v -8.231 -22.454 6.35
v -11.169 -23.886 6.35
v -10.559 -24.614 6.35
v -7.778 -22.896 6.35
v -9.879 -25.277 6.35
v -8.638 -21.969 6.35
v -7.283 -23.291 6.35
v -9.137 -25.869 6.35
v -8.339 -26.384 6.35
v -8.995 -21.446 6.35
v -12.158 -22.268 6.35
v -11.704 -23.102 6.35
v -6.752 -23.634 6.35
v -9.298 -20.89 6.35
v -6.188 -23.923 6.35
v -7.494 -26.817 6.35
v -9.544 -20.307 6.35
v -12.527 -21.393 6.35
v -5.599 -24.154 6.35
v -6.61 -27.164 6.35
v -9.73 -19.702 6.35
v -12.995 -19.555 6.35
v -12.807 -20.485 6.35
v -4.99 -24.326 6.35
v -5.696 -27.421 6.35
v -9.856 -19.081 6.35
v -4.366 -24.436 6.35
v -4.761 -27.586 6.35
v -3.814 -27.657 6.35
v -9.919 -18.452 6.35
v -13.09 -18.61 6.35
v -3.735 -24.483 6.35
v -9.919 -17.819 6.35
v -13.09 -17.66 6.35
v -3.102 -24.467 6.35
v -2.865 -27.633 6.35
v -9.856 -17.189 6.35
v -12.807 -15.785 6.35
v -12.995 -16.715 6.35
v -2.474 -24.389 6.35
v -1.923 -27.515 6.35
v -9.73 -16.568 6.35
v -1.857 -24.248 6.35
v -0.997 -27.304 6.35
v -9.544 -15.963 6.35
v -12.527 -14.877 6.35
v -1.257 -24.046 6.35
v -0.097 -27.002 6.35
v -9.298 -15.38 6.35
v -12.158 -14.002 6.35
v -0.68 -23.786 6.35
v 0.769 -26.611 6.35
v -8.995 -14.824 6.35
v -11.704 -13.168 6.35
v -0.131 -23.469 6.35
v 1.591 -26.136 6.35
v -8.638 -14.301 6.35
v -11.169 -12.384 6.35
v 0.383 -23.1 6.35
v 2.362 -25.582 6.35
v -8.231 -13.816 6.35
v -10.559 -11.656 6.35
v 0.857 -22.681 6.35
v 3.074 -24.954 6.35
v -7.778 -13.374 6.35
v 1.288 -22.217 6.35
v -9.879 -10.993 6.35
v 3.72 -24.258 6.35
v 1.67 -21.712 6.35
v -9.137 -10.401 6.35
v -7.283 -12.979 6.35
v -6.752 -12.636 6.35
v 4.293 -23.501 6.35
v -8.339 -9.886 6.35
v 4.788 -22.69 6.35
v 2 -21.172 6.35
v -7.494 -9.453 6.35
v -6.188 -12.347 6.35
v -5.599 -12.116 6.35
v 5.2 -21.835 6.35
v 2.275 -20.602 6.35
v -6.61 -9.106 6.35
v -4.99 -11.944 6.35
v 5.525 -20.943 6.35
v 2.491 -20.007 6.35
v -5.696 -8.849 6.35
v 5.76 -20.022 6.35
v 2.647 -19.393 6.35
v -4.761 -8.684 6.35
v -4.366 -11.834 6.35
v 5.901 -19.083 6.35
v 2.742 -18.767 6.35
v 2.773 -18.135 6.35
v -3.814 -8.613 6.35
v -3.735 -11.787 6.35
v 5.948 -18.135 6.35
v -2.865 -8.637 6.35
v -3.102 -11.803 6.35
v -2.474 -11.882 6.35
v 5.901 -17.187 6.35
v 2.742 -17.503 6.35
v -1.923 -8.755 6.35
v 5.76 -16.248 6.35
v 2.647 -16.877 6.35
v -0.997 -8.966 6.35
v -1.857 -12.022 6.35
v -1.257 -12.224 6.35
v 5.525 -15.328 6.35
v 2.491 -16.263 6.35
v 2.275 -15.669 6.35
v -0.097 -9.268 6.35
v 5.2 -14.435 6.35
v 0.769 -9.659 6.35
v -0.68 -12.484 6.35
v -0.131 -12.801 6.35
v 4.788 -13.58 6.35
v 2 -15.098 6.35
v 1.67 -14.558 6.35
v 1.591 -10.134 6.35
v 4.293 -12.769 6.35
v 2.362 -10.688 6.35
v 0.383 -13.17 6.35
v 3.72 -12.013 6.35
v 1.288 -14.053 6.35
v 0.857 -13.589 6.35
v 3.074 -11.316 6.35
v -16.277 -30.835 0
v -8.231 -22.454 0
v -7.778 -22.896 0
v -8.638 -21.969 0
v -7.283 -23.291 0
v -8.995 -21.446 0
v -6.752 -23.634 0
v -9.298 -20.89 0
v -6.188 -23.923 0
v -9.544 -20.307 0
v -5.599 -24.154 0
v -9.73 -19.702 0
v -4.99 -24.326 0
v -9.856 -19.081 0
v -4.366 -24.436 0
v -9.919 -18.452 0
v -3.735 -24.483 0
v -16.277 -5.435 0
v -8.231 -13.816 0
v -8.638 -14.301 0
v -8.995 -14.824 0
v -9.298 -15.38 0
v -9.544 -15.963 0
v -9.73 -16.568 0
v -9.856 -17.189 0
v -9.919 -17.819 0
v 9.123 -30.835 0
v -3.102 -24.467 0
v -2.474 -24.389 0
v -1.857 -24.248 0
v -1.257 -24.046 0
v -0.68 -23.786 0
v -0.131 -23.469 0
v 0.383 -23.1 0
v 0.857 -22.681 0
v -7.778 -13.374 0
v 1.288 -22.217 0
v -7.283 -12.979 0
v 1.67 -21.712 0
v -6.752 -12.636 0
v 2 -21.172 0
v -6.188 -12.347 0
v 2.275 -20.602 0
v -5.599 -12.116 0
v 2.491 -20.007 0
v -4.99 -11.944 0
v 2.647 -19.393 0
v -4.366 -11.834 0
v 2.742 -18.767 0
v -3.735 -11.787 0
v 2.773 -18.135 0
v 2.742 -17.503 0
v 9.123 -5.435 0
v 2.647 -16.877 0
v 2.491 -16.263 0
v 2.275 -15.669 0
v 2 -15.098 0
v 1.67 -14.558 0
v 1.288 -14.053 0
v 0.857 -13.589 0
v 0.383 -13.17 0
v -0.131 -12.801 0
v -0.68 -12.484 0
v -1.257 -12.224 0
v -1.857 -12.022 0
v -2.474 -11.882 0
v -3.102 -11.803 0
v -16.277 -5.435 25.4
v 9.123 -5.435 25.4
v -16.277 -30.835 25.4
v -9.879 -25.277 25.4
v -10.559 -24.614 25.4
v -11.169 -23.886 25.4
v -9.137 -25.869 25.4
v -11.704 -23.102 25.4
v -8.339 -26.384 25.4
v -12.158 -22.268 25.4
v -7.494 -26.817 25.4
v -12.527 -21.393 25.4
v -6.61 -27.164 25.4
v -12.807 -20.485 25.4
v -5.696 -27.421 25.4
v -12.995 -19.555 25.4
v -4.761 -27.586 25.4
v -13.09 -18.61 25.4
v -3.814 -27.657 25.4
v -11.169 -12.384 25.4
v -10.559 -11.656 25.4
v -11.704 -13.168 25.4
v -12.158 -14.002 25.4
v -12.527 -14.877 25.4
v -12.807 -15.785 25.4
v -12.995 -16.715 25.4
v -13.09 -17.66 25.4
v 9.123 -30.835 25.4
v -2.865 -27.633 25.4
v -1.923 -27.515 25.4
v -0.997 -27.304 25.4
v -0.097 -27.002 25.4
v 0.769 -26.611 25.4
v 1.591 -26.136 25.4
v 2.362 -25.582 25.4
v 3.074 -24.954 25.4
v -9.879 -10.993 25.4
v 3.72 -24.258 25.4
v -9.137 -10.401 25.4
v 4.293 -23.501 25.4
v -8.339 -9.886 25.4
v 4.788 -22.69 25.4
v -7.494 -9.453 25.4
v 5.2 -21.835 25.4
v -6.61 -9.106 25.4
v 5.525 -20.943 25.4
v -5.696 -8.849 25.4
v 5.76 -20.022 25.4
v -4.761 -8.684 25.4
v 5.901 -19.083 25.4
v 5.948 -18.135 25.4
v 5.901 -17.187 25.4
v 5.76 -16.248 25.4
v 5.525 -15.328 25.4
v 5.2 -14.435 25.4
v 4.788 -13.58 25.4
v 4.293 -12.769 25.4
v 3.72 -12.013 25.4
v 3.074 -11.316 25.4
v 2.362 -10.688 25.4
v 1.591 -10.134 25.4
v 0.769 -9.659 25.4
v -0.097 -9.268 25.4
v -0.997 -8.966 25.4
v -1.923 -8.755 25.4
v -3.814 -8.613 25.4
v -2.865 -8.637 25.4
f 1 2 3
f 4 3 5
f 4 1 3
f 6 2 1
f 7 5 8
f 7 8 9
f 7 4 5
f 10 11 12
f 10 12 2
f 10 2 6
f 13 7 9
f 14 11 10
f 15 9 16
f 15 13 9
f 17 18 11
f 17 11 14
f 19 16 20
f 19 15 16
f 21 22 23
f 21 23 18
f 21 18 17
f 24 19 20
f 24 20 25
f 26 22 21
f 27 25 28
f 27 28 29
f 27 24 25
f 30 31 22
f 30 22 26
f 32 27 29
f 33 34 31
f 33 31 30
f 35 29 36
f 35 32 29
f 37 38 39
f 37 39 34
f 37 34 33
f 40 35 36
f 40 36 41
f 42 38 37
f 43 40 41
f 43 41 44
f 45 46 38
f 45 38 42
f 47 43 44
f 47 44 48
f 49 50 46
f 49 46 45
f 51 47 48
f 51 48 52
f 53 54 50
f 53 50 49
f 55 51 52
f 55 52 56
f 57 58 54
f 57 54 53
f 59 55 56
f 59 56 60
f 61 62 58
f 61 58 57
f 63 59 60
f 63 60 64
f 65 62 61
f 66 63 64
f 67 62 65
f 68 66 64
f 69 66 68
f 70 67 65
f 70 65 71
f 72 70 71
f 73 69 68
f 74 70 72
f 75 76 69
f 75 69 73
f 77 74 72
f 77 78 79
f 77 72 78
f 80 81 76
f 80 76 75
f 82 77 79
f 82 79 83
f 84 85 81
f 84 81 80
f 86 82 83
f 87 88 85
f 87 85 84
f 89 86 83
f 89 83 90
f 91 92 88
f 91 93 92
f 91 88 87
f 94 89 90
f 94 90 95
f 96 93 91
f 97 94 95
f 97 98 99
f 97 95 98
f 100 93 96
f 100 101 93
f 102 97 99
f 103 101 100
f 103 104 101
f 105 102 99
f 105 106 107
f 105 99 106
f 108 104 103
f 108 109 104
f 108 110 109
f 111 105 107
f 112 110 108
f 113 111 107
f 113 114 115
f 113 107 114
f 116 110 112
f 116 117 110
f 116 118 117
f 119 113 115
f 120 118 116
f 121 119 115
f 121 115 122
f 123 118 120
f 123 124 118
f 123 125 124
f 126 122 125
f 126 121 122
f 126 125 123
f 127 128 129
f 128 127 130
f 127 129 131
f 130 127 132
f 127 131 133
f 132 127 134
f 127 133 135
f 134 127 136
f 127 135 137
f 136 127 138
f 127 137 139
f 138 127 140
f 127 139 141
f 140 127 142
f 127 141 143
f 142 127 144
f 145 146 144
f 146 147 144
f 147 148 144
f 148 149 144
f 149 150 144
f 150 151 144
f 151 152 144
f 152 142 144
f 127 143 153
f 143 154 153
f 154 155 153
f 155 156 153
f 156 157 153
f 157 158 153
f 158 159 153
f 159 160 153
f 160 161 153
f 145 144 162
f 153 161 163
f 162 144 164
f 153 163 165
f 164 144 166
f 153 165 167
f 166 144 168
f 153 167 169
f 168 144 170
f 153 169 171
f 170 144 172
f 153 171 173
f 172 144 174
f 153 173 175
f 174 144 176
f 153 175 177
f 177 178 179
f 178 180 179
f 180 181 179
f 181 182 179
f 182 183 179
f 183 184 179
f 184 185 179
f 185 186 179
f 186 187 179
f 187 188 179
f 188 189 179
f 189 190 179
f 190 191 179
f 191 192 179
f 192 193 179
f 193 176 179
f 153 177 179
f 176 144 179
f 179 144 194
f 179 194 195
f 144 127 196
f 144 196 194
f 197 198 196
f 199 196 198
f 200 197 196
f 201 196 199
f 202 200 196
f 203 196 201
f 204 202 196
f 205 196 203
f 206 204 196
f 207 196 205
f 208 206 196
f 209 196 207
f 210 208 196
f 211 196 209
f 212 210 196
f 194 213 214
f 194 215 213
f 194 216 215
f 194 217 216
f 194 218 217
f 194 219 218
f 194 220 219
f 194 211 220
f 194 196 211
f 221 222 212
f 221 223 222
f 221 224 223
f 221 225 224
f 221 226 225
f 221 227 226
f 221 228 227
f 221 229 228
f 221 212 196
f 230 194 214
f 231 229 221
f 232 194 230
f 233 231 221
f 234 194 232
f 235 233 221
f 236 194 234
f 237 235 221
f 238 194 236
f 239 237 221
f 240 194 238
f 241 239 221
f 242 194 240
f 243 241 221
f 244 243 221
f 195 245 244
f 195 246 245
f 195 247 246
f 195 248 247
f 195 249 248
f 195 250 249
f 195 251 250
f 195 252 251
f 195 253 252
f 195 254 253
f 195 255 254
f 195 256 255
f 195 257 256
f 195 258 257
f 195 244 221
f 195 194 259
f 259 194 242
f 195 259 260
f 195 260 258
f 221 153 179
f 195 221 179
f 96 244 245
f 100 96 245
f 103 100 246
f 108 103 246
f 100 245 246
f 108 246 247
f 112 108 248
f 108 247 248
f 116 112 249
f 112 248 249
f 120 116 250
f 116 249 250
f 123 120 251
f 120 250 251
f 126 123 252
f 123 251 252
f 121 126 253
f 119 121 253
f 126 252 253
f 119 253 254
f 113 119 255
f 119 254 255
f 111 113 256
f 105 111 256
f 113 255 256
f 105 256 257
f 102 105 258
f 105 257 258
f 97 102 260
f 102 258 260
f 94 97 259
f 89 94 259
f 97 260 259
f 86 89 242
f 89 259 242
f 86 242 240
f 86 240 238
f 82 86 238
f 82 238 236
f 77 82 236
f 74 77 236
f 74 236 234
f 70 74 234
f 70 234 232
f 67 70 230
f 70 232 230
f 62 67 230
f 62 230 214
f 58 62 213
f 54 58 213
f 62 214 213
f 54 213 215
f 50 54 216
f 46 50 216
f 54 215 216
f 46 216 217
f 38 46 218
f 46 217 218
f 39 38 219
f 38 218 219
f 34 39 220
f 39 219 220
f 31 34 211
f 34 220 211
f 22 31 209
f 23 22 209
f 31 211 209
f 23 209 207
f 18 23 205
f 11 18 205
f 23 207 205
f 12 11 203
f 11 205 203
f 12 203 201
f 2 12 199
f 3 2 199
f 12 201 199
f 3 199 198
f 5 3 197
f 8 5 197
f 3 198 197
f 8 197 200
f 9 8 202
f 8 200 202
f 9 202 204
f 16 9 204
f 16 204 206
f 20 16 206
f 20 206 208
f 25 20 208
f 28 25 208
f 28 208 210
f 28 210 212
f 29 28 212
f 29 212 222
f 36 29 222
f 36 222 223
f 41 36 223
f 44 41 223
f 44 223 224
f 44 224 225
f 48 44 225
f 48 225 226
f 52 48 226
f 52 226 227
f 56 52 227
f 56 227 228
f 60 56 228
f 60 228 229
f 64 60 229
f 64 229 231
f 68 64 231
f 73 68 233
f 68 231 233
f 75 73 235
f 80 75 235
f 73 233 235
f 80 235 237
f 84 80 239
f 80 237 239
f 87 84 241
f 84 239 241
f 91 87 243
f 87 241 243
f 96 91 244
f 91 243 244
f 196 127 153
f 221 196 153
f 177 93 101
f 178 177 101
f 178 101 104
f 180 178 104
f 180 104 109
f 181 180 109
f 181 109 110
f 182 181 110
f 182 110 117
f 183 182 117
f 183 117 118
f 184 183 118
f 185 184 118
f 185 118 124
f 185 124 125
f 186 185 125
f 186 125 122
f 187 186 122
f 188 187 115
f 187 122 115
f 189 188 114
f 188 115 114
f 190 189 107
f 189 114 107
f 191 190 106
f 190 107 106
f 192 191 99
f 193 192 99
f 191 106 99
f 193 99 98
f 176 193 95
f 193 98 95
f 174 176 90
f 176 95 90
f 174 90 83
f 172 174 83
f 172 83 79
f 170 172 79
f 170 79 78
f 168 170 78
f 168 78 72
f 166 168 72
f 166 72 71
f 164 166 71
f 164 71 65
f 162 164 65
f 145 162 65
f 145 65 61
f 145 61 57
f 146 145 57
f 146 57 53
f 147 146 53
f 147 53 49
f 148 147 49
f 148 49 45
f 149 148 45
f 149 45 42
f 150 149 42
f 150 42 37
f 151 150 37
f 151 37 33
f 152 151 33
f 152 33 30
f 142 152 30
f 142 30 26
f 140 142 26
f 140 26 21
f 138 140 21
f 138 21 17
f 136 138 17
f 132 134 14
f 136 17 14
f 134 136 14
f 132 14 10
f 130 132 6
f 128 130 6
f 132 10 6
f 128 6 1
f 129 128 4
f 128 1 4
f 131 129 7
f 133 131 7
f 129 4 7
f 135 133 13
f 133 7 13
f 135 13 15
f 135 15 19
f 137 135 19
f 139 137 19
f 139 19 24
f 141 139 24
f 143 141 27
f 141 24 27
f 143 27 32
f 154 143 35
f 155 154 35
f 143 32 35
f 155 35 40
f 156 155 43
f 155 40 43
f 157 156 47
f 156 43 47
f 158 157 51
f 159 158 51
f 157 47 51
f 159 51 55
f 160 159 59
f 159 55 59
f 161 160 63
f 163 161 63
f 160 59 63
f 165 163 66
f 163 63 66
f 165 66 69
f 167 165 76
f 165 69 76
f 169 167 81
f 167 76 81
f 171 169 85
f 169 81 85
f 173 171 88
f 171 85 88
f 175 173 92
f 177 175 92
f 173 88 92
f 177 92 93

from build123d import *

# Parameters (mm, degrees)
F0_W     = 25.4
F0_H     = 25.4
F1_DEPTH = 25.4
F2_R     = 9.525
F3_DEPTH = 19.05
F4_R     = 6.35
F5_DEPTH = 6.351


with BuildPart() as f1:
    # F0 (on Top) → F1 (new body)
    with BuildSketch(Plane.XY):
        with Locations((-3.576601, -18.135061)):
            Rectangle(F0_W, F0_H)
    extrude(amount=F1_DEPTH)

    # F2 (on face) → F3 (cut)
    with BuildSketch(Plane.XY.offset(25.4)):
        with Locations((-3.576601, -18.135061)):
            Circle(F2_R)
    extrude(amount=-F3_DEPTH, mode=Mode.SUBTRACT)

    # F4 (on face) → F5 (cut, through all)
    with BuildSketch(Plane.XY.offset(6.35)):
        with Locations((-3.576601, -18.135061)):
            Circle(F4_R)
    extrude(amount=-F5_DEPTH, mode=Mode.SUBTRACT)


solid = f1.part
